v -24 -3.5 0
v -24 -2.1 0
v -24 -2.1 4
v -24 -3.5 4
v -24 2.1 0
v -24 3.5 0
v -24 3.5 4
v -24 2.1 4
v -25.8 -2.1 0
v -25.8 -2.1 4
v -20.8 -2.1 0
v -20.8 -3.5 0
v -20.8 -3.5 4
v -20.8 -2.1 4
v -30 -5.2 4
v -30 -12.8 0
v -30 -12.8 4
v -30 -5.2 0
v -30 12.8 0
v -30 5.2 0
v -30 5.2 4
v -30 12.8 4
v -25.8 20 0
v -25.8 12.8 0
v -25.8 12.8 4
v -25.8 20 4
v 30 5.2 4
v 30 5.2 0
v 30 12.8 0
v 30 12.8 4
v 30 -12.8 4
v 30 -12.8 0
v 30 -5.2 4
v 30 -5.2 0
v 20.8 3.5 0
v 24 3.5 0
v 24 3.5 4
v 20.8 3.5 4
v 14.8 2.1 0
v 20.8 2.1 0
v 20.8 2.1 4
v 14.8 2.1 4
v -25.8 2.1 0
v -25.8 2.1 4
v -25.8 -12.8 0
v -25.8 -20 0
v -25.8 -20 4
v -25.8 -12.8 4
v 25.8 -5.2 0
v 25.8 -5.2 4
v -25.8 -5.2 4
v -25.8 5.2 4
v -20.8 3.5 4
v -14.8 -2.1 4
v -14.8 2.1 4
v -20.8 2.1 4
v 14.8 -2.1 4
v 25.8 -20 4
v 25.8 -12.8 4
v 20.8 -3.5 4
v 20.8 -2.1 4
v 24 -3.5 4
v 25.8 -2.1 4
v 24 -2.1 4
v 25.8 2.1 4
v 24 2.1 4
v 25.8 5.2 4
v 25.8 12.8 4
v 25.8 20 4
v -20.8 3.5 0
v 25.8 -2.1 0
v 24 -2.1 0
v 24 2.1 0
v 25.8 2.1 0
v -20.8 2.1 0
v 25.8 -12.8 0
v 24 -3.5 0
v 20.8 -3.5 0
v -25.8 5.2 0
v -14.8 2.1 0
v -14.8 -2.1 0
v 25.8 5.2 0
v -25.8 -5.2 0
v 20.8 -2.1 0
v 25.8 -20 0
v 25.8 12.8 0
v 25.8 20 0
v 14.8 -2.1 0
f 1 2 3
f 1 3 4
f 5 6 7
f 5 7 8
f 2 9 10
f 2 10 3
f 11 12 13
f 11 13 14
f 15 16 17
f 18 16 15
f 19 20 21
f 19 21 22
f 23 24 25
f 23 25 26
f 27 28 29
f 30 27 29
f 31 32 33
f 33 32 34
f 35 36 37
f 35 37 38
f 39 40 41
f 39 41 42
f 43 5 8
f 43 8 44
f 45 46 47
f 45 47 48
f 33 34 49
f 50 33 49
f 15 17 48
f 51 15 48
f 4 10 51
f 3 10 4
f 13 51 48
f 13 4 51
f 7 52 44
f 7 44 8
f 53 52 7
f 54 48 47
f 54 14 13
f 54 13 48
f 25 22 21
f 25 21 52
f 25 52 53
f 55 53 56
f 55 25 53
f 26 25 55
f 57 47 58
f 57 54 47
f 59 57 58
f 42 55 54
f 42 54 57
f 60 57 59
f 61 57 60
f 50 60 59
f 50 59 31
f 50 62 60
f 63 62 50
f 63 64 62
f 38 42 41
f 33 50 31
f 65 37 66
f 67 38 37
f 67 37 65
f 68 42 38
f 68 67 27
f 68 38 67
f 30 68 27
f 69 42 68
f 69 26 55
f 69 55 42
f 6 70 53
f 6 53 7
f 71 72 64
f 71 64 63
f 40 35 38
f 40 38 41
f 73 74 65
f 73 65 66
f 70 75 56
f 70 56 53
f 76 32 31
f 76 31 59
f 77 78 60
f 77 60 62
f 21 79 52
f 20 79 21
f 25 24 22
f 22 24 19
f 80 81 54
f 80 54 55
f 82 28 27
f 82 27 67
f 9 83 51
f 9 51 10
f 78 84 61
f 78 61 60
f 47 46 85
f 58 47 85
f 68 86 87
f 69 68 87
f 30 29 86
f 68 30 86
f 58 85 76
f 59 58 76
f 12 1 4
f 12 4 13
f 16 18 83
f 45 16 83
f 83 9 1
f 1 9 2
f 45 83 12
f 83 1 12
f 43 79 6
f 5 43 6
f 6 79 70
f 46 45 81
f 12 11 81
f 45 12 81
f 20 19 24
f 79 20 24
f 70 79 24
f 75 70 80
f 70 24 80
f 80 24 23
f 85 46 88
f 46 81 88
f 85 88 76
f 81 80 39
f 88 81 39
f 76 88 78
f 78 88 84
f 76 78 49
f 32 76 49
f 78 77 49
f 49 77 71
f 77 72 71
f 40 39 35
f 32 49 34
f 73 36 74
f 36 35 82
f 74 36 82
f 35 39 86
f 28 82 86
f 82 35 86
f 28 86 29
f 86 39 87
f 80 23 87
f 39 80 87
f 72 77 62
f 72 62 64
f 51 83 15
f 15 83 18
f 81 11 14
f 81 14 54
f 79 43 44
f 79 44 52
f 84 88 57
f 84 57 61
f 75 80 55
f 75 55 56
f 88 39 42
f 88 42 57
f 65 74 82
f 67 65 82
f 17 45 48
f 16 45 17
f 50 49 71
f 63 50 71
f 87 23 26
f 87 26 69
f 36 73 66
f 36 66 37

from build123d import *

# Parameters (mm, degrees)
ESQUISSE1_W             = 60
ESQUISSE1_H             = 40
BOSS_EXTRU_1_DEPTH      = 4
ESQUISSE2_W             = 4.4
ESQUISSE2_H             = 7.4
ESQUISSE2_H_2           = 10.4
ENL_V_MAT_EXTRU_1_DEPTH = 37.276714294
ENL_V_MAT_EXTRU_2_DEPTH = 37.276714294


with BuildPart() as part:
    # Esquisse1 → Boss.-Extru.1 (new body)
    with BuildSketch(Plane.XY):
        Rectangle(ESQUISSE1_W, ESQUISSE1_H)
    extrude(amount=BOSS_EXTRU_1_DEPTH)

    # Esquisse2 → Enlèv. mat.-Extru.1 (cut, through all)
    with BuildSketch(Plane(origin=(0, 0, 0), x_dir=(-1, 0, 0), z_dir=(0, 0, -1))):
        with Locations((-28, -16.5)):
            Rectangle(ESQUISSE2_W, ESQUISSE2_H)
        with Locations((-28, 16.5)):
            Rectangle(ESQUISSE2_W, ESQUISSE2_H)
        with Locations((-28, 0)):
            Rectangle(ESQUISSE2_W, ESQUISSE2_H_2)
        with Locations((28, 0)):
            Rectangle(ESQUISSE2_W, ESQUISSE2_H_2)
        with Locations((28, 16.5)):
            Rectangle(ESQUISSE2_W, ESQUISSE2_H)
        with Locations((28, -16.5)):
            Rectangle(ESQUISSE2_W, ESQUISSE2_H)
    extrude(amount=-ENL_V_MAT_EXTRU_1_DEPTH, mode=Mode.SUBTRACT)

    # Esquisse3 → Enlèv. mat.-Extru.2 (cut, through all)
    with BuildSketch(Plane(origin=(0, 0, 0), x_dir=(-1, 0, 0), z_dir=(0, 0, -1))):
        Polygon((-25.8, -2.1), (-25.8, 2.1), (-24, 2.1), (-24, 3.5), (-20.8, 3.5), (-20.8, 2.1), (-14.8, 2.1), (-14.8, -2.1), (-20.8, -2.1), (-20.8, -3.5), (-24, -3.5), (-24, -2.1), align=None)
        Polygon((25.8, -2.1), (24, -2.1), (24, -3.5), (20.8, -3.5), (20.8, -2.1), (14.8, -2.1), (14.8, 2.1), (20.8, 2.1), (20.8, 3.5), (24, 3.5), (24, 2.1), (25.8, 2.1), align=None)
    extrude(amount=-ENL_V_MAT_EXTRU_2_DEPTH, mode=Mode.SUBTRACT)


solid = part.part
